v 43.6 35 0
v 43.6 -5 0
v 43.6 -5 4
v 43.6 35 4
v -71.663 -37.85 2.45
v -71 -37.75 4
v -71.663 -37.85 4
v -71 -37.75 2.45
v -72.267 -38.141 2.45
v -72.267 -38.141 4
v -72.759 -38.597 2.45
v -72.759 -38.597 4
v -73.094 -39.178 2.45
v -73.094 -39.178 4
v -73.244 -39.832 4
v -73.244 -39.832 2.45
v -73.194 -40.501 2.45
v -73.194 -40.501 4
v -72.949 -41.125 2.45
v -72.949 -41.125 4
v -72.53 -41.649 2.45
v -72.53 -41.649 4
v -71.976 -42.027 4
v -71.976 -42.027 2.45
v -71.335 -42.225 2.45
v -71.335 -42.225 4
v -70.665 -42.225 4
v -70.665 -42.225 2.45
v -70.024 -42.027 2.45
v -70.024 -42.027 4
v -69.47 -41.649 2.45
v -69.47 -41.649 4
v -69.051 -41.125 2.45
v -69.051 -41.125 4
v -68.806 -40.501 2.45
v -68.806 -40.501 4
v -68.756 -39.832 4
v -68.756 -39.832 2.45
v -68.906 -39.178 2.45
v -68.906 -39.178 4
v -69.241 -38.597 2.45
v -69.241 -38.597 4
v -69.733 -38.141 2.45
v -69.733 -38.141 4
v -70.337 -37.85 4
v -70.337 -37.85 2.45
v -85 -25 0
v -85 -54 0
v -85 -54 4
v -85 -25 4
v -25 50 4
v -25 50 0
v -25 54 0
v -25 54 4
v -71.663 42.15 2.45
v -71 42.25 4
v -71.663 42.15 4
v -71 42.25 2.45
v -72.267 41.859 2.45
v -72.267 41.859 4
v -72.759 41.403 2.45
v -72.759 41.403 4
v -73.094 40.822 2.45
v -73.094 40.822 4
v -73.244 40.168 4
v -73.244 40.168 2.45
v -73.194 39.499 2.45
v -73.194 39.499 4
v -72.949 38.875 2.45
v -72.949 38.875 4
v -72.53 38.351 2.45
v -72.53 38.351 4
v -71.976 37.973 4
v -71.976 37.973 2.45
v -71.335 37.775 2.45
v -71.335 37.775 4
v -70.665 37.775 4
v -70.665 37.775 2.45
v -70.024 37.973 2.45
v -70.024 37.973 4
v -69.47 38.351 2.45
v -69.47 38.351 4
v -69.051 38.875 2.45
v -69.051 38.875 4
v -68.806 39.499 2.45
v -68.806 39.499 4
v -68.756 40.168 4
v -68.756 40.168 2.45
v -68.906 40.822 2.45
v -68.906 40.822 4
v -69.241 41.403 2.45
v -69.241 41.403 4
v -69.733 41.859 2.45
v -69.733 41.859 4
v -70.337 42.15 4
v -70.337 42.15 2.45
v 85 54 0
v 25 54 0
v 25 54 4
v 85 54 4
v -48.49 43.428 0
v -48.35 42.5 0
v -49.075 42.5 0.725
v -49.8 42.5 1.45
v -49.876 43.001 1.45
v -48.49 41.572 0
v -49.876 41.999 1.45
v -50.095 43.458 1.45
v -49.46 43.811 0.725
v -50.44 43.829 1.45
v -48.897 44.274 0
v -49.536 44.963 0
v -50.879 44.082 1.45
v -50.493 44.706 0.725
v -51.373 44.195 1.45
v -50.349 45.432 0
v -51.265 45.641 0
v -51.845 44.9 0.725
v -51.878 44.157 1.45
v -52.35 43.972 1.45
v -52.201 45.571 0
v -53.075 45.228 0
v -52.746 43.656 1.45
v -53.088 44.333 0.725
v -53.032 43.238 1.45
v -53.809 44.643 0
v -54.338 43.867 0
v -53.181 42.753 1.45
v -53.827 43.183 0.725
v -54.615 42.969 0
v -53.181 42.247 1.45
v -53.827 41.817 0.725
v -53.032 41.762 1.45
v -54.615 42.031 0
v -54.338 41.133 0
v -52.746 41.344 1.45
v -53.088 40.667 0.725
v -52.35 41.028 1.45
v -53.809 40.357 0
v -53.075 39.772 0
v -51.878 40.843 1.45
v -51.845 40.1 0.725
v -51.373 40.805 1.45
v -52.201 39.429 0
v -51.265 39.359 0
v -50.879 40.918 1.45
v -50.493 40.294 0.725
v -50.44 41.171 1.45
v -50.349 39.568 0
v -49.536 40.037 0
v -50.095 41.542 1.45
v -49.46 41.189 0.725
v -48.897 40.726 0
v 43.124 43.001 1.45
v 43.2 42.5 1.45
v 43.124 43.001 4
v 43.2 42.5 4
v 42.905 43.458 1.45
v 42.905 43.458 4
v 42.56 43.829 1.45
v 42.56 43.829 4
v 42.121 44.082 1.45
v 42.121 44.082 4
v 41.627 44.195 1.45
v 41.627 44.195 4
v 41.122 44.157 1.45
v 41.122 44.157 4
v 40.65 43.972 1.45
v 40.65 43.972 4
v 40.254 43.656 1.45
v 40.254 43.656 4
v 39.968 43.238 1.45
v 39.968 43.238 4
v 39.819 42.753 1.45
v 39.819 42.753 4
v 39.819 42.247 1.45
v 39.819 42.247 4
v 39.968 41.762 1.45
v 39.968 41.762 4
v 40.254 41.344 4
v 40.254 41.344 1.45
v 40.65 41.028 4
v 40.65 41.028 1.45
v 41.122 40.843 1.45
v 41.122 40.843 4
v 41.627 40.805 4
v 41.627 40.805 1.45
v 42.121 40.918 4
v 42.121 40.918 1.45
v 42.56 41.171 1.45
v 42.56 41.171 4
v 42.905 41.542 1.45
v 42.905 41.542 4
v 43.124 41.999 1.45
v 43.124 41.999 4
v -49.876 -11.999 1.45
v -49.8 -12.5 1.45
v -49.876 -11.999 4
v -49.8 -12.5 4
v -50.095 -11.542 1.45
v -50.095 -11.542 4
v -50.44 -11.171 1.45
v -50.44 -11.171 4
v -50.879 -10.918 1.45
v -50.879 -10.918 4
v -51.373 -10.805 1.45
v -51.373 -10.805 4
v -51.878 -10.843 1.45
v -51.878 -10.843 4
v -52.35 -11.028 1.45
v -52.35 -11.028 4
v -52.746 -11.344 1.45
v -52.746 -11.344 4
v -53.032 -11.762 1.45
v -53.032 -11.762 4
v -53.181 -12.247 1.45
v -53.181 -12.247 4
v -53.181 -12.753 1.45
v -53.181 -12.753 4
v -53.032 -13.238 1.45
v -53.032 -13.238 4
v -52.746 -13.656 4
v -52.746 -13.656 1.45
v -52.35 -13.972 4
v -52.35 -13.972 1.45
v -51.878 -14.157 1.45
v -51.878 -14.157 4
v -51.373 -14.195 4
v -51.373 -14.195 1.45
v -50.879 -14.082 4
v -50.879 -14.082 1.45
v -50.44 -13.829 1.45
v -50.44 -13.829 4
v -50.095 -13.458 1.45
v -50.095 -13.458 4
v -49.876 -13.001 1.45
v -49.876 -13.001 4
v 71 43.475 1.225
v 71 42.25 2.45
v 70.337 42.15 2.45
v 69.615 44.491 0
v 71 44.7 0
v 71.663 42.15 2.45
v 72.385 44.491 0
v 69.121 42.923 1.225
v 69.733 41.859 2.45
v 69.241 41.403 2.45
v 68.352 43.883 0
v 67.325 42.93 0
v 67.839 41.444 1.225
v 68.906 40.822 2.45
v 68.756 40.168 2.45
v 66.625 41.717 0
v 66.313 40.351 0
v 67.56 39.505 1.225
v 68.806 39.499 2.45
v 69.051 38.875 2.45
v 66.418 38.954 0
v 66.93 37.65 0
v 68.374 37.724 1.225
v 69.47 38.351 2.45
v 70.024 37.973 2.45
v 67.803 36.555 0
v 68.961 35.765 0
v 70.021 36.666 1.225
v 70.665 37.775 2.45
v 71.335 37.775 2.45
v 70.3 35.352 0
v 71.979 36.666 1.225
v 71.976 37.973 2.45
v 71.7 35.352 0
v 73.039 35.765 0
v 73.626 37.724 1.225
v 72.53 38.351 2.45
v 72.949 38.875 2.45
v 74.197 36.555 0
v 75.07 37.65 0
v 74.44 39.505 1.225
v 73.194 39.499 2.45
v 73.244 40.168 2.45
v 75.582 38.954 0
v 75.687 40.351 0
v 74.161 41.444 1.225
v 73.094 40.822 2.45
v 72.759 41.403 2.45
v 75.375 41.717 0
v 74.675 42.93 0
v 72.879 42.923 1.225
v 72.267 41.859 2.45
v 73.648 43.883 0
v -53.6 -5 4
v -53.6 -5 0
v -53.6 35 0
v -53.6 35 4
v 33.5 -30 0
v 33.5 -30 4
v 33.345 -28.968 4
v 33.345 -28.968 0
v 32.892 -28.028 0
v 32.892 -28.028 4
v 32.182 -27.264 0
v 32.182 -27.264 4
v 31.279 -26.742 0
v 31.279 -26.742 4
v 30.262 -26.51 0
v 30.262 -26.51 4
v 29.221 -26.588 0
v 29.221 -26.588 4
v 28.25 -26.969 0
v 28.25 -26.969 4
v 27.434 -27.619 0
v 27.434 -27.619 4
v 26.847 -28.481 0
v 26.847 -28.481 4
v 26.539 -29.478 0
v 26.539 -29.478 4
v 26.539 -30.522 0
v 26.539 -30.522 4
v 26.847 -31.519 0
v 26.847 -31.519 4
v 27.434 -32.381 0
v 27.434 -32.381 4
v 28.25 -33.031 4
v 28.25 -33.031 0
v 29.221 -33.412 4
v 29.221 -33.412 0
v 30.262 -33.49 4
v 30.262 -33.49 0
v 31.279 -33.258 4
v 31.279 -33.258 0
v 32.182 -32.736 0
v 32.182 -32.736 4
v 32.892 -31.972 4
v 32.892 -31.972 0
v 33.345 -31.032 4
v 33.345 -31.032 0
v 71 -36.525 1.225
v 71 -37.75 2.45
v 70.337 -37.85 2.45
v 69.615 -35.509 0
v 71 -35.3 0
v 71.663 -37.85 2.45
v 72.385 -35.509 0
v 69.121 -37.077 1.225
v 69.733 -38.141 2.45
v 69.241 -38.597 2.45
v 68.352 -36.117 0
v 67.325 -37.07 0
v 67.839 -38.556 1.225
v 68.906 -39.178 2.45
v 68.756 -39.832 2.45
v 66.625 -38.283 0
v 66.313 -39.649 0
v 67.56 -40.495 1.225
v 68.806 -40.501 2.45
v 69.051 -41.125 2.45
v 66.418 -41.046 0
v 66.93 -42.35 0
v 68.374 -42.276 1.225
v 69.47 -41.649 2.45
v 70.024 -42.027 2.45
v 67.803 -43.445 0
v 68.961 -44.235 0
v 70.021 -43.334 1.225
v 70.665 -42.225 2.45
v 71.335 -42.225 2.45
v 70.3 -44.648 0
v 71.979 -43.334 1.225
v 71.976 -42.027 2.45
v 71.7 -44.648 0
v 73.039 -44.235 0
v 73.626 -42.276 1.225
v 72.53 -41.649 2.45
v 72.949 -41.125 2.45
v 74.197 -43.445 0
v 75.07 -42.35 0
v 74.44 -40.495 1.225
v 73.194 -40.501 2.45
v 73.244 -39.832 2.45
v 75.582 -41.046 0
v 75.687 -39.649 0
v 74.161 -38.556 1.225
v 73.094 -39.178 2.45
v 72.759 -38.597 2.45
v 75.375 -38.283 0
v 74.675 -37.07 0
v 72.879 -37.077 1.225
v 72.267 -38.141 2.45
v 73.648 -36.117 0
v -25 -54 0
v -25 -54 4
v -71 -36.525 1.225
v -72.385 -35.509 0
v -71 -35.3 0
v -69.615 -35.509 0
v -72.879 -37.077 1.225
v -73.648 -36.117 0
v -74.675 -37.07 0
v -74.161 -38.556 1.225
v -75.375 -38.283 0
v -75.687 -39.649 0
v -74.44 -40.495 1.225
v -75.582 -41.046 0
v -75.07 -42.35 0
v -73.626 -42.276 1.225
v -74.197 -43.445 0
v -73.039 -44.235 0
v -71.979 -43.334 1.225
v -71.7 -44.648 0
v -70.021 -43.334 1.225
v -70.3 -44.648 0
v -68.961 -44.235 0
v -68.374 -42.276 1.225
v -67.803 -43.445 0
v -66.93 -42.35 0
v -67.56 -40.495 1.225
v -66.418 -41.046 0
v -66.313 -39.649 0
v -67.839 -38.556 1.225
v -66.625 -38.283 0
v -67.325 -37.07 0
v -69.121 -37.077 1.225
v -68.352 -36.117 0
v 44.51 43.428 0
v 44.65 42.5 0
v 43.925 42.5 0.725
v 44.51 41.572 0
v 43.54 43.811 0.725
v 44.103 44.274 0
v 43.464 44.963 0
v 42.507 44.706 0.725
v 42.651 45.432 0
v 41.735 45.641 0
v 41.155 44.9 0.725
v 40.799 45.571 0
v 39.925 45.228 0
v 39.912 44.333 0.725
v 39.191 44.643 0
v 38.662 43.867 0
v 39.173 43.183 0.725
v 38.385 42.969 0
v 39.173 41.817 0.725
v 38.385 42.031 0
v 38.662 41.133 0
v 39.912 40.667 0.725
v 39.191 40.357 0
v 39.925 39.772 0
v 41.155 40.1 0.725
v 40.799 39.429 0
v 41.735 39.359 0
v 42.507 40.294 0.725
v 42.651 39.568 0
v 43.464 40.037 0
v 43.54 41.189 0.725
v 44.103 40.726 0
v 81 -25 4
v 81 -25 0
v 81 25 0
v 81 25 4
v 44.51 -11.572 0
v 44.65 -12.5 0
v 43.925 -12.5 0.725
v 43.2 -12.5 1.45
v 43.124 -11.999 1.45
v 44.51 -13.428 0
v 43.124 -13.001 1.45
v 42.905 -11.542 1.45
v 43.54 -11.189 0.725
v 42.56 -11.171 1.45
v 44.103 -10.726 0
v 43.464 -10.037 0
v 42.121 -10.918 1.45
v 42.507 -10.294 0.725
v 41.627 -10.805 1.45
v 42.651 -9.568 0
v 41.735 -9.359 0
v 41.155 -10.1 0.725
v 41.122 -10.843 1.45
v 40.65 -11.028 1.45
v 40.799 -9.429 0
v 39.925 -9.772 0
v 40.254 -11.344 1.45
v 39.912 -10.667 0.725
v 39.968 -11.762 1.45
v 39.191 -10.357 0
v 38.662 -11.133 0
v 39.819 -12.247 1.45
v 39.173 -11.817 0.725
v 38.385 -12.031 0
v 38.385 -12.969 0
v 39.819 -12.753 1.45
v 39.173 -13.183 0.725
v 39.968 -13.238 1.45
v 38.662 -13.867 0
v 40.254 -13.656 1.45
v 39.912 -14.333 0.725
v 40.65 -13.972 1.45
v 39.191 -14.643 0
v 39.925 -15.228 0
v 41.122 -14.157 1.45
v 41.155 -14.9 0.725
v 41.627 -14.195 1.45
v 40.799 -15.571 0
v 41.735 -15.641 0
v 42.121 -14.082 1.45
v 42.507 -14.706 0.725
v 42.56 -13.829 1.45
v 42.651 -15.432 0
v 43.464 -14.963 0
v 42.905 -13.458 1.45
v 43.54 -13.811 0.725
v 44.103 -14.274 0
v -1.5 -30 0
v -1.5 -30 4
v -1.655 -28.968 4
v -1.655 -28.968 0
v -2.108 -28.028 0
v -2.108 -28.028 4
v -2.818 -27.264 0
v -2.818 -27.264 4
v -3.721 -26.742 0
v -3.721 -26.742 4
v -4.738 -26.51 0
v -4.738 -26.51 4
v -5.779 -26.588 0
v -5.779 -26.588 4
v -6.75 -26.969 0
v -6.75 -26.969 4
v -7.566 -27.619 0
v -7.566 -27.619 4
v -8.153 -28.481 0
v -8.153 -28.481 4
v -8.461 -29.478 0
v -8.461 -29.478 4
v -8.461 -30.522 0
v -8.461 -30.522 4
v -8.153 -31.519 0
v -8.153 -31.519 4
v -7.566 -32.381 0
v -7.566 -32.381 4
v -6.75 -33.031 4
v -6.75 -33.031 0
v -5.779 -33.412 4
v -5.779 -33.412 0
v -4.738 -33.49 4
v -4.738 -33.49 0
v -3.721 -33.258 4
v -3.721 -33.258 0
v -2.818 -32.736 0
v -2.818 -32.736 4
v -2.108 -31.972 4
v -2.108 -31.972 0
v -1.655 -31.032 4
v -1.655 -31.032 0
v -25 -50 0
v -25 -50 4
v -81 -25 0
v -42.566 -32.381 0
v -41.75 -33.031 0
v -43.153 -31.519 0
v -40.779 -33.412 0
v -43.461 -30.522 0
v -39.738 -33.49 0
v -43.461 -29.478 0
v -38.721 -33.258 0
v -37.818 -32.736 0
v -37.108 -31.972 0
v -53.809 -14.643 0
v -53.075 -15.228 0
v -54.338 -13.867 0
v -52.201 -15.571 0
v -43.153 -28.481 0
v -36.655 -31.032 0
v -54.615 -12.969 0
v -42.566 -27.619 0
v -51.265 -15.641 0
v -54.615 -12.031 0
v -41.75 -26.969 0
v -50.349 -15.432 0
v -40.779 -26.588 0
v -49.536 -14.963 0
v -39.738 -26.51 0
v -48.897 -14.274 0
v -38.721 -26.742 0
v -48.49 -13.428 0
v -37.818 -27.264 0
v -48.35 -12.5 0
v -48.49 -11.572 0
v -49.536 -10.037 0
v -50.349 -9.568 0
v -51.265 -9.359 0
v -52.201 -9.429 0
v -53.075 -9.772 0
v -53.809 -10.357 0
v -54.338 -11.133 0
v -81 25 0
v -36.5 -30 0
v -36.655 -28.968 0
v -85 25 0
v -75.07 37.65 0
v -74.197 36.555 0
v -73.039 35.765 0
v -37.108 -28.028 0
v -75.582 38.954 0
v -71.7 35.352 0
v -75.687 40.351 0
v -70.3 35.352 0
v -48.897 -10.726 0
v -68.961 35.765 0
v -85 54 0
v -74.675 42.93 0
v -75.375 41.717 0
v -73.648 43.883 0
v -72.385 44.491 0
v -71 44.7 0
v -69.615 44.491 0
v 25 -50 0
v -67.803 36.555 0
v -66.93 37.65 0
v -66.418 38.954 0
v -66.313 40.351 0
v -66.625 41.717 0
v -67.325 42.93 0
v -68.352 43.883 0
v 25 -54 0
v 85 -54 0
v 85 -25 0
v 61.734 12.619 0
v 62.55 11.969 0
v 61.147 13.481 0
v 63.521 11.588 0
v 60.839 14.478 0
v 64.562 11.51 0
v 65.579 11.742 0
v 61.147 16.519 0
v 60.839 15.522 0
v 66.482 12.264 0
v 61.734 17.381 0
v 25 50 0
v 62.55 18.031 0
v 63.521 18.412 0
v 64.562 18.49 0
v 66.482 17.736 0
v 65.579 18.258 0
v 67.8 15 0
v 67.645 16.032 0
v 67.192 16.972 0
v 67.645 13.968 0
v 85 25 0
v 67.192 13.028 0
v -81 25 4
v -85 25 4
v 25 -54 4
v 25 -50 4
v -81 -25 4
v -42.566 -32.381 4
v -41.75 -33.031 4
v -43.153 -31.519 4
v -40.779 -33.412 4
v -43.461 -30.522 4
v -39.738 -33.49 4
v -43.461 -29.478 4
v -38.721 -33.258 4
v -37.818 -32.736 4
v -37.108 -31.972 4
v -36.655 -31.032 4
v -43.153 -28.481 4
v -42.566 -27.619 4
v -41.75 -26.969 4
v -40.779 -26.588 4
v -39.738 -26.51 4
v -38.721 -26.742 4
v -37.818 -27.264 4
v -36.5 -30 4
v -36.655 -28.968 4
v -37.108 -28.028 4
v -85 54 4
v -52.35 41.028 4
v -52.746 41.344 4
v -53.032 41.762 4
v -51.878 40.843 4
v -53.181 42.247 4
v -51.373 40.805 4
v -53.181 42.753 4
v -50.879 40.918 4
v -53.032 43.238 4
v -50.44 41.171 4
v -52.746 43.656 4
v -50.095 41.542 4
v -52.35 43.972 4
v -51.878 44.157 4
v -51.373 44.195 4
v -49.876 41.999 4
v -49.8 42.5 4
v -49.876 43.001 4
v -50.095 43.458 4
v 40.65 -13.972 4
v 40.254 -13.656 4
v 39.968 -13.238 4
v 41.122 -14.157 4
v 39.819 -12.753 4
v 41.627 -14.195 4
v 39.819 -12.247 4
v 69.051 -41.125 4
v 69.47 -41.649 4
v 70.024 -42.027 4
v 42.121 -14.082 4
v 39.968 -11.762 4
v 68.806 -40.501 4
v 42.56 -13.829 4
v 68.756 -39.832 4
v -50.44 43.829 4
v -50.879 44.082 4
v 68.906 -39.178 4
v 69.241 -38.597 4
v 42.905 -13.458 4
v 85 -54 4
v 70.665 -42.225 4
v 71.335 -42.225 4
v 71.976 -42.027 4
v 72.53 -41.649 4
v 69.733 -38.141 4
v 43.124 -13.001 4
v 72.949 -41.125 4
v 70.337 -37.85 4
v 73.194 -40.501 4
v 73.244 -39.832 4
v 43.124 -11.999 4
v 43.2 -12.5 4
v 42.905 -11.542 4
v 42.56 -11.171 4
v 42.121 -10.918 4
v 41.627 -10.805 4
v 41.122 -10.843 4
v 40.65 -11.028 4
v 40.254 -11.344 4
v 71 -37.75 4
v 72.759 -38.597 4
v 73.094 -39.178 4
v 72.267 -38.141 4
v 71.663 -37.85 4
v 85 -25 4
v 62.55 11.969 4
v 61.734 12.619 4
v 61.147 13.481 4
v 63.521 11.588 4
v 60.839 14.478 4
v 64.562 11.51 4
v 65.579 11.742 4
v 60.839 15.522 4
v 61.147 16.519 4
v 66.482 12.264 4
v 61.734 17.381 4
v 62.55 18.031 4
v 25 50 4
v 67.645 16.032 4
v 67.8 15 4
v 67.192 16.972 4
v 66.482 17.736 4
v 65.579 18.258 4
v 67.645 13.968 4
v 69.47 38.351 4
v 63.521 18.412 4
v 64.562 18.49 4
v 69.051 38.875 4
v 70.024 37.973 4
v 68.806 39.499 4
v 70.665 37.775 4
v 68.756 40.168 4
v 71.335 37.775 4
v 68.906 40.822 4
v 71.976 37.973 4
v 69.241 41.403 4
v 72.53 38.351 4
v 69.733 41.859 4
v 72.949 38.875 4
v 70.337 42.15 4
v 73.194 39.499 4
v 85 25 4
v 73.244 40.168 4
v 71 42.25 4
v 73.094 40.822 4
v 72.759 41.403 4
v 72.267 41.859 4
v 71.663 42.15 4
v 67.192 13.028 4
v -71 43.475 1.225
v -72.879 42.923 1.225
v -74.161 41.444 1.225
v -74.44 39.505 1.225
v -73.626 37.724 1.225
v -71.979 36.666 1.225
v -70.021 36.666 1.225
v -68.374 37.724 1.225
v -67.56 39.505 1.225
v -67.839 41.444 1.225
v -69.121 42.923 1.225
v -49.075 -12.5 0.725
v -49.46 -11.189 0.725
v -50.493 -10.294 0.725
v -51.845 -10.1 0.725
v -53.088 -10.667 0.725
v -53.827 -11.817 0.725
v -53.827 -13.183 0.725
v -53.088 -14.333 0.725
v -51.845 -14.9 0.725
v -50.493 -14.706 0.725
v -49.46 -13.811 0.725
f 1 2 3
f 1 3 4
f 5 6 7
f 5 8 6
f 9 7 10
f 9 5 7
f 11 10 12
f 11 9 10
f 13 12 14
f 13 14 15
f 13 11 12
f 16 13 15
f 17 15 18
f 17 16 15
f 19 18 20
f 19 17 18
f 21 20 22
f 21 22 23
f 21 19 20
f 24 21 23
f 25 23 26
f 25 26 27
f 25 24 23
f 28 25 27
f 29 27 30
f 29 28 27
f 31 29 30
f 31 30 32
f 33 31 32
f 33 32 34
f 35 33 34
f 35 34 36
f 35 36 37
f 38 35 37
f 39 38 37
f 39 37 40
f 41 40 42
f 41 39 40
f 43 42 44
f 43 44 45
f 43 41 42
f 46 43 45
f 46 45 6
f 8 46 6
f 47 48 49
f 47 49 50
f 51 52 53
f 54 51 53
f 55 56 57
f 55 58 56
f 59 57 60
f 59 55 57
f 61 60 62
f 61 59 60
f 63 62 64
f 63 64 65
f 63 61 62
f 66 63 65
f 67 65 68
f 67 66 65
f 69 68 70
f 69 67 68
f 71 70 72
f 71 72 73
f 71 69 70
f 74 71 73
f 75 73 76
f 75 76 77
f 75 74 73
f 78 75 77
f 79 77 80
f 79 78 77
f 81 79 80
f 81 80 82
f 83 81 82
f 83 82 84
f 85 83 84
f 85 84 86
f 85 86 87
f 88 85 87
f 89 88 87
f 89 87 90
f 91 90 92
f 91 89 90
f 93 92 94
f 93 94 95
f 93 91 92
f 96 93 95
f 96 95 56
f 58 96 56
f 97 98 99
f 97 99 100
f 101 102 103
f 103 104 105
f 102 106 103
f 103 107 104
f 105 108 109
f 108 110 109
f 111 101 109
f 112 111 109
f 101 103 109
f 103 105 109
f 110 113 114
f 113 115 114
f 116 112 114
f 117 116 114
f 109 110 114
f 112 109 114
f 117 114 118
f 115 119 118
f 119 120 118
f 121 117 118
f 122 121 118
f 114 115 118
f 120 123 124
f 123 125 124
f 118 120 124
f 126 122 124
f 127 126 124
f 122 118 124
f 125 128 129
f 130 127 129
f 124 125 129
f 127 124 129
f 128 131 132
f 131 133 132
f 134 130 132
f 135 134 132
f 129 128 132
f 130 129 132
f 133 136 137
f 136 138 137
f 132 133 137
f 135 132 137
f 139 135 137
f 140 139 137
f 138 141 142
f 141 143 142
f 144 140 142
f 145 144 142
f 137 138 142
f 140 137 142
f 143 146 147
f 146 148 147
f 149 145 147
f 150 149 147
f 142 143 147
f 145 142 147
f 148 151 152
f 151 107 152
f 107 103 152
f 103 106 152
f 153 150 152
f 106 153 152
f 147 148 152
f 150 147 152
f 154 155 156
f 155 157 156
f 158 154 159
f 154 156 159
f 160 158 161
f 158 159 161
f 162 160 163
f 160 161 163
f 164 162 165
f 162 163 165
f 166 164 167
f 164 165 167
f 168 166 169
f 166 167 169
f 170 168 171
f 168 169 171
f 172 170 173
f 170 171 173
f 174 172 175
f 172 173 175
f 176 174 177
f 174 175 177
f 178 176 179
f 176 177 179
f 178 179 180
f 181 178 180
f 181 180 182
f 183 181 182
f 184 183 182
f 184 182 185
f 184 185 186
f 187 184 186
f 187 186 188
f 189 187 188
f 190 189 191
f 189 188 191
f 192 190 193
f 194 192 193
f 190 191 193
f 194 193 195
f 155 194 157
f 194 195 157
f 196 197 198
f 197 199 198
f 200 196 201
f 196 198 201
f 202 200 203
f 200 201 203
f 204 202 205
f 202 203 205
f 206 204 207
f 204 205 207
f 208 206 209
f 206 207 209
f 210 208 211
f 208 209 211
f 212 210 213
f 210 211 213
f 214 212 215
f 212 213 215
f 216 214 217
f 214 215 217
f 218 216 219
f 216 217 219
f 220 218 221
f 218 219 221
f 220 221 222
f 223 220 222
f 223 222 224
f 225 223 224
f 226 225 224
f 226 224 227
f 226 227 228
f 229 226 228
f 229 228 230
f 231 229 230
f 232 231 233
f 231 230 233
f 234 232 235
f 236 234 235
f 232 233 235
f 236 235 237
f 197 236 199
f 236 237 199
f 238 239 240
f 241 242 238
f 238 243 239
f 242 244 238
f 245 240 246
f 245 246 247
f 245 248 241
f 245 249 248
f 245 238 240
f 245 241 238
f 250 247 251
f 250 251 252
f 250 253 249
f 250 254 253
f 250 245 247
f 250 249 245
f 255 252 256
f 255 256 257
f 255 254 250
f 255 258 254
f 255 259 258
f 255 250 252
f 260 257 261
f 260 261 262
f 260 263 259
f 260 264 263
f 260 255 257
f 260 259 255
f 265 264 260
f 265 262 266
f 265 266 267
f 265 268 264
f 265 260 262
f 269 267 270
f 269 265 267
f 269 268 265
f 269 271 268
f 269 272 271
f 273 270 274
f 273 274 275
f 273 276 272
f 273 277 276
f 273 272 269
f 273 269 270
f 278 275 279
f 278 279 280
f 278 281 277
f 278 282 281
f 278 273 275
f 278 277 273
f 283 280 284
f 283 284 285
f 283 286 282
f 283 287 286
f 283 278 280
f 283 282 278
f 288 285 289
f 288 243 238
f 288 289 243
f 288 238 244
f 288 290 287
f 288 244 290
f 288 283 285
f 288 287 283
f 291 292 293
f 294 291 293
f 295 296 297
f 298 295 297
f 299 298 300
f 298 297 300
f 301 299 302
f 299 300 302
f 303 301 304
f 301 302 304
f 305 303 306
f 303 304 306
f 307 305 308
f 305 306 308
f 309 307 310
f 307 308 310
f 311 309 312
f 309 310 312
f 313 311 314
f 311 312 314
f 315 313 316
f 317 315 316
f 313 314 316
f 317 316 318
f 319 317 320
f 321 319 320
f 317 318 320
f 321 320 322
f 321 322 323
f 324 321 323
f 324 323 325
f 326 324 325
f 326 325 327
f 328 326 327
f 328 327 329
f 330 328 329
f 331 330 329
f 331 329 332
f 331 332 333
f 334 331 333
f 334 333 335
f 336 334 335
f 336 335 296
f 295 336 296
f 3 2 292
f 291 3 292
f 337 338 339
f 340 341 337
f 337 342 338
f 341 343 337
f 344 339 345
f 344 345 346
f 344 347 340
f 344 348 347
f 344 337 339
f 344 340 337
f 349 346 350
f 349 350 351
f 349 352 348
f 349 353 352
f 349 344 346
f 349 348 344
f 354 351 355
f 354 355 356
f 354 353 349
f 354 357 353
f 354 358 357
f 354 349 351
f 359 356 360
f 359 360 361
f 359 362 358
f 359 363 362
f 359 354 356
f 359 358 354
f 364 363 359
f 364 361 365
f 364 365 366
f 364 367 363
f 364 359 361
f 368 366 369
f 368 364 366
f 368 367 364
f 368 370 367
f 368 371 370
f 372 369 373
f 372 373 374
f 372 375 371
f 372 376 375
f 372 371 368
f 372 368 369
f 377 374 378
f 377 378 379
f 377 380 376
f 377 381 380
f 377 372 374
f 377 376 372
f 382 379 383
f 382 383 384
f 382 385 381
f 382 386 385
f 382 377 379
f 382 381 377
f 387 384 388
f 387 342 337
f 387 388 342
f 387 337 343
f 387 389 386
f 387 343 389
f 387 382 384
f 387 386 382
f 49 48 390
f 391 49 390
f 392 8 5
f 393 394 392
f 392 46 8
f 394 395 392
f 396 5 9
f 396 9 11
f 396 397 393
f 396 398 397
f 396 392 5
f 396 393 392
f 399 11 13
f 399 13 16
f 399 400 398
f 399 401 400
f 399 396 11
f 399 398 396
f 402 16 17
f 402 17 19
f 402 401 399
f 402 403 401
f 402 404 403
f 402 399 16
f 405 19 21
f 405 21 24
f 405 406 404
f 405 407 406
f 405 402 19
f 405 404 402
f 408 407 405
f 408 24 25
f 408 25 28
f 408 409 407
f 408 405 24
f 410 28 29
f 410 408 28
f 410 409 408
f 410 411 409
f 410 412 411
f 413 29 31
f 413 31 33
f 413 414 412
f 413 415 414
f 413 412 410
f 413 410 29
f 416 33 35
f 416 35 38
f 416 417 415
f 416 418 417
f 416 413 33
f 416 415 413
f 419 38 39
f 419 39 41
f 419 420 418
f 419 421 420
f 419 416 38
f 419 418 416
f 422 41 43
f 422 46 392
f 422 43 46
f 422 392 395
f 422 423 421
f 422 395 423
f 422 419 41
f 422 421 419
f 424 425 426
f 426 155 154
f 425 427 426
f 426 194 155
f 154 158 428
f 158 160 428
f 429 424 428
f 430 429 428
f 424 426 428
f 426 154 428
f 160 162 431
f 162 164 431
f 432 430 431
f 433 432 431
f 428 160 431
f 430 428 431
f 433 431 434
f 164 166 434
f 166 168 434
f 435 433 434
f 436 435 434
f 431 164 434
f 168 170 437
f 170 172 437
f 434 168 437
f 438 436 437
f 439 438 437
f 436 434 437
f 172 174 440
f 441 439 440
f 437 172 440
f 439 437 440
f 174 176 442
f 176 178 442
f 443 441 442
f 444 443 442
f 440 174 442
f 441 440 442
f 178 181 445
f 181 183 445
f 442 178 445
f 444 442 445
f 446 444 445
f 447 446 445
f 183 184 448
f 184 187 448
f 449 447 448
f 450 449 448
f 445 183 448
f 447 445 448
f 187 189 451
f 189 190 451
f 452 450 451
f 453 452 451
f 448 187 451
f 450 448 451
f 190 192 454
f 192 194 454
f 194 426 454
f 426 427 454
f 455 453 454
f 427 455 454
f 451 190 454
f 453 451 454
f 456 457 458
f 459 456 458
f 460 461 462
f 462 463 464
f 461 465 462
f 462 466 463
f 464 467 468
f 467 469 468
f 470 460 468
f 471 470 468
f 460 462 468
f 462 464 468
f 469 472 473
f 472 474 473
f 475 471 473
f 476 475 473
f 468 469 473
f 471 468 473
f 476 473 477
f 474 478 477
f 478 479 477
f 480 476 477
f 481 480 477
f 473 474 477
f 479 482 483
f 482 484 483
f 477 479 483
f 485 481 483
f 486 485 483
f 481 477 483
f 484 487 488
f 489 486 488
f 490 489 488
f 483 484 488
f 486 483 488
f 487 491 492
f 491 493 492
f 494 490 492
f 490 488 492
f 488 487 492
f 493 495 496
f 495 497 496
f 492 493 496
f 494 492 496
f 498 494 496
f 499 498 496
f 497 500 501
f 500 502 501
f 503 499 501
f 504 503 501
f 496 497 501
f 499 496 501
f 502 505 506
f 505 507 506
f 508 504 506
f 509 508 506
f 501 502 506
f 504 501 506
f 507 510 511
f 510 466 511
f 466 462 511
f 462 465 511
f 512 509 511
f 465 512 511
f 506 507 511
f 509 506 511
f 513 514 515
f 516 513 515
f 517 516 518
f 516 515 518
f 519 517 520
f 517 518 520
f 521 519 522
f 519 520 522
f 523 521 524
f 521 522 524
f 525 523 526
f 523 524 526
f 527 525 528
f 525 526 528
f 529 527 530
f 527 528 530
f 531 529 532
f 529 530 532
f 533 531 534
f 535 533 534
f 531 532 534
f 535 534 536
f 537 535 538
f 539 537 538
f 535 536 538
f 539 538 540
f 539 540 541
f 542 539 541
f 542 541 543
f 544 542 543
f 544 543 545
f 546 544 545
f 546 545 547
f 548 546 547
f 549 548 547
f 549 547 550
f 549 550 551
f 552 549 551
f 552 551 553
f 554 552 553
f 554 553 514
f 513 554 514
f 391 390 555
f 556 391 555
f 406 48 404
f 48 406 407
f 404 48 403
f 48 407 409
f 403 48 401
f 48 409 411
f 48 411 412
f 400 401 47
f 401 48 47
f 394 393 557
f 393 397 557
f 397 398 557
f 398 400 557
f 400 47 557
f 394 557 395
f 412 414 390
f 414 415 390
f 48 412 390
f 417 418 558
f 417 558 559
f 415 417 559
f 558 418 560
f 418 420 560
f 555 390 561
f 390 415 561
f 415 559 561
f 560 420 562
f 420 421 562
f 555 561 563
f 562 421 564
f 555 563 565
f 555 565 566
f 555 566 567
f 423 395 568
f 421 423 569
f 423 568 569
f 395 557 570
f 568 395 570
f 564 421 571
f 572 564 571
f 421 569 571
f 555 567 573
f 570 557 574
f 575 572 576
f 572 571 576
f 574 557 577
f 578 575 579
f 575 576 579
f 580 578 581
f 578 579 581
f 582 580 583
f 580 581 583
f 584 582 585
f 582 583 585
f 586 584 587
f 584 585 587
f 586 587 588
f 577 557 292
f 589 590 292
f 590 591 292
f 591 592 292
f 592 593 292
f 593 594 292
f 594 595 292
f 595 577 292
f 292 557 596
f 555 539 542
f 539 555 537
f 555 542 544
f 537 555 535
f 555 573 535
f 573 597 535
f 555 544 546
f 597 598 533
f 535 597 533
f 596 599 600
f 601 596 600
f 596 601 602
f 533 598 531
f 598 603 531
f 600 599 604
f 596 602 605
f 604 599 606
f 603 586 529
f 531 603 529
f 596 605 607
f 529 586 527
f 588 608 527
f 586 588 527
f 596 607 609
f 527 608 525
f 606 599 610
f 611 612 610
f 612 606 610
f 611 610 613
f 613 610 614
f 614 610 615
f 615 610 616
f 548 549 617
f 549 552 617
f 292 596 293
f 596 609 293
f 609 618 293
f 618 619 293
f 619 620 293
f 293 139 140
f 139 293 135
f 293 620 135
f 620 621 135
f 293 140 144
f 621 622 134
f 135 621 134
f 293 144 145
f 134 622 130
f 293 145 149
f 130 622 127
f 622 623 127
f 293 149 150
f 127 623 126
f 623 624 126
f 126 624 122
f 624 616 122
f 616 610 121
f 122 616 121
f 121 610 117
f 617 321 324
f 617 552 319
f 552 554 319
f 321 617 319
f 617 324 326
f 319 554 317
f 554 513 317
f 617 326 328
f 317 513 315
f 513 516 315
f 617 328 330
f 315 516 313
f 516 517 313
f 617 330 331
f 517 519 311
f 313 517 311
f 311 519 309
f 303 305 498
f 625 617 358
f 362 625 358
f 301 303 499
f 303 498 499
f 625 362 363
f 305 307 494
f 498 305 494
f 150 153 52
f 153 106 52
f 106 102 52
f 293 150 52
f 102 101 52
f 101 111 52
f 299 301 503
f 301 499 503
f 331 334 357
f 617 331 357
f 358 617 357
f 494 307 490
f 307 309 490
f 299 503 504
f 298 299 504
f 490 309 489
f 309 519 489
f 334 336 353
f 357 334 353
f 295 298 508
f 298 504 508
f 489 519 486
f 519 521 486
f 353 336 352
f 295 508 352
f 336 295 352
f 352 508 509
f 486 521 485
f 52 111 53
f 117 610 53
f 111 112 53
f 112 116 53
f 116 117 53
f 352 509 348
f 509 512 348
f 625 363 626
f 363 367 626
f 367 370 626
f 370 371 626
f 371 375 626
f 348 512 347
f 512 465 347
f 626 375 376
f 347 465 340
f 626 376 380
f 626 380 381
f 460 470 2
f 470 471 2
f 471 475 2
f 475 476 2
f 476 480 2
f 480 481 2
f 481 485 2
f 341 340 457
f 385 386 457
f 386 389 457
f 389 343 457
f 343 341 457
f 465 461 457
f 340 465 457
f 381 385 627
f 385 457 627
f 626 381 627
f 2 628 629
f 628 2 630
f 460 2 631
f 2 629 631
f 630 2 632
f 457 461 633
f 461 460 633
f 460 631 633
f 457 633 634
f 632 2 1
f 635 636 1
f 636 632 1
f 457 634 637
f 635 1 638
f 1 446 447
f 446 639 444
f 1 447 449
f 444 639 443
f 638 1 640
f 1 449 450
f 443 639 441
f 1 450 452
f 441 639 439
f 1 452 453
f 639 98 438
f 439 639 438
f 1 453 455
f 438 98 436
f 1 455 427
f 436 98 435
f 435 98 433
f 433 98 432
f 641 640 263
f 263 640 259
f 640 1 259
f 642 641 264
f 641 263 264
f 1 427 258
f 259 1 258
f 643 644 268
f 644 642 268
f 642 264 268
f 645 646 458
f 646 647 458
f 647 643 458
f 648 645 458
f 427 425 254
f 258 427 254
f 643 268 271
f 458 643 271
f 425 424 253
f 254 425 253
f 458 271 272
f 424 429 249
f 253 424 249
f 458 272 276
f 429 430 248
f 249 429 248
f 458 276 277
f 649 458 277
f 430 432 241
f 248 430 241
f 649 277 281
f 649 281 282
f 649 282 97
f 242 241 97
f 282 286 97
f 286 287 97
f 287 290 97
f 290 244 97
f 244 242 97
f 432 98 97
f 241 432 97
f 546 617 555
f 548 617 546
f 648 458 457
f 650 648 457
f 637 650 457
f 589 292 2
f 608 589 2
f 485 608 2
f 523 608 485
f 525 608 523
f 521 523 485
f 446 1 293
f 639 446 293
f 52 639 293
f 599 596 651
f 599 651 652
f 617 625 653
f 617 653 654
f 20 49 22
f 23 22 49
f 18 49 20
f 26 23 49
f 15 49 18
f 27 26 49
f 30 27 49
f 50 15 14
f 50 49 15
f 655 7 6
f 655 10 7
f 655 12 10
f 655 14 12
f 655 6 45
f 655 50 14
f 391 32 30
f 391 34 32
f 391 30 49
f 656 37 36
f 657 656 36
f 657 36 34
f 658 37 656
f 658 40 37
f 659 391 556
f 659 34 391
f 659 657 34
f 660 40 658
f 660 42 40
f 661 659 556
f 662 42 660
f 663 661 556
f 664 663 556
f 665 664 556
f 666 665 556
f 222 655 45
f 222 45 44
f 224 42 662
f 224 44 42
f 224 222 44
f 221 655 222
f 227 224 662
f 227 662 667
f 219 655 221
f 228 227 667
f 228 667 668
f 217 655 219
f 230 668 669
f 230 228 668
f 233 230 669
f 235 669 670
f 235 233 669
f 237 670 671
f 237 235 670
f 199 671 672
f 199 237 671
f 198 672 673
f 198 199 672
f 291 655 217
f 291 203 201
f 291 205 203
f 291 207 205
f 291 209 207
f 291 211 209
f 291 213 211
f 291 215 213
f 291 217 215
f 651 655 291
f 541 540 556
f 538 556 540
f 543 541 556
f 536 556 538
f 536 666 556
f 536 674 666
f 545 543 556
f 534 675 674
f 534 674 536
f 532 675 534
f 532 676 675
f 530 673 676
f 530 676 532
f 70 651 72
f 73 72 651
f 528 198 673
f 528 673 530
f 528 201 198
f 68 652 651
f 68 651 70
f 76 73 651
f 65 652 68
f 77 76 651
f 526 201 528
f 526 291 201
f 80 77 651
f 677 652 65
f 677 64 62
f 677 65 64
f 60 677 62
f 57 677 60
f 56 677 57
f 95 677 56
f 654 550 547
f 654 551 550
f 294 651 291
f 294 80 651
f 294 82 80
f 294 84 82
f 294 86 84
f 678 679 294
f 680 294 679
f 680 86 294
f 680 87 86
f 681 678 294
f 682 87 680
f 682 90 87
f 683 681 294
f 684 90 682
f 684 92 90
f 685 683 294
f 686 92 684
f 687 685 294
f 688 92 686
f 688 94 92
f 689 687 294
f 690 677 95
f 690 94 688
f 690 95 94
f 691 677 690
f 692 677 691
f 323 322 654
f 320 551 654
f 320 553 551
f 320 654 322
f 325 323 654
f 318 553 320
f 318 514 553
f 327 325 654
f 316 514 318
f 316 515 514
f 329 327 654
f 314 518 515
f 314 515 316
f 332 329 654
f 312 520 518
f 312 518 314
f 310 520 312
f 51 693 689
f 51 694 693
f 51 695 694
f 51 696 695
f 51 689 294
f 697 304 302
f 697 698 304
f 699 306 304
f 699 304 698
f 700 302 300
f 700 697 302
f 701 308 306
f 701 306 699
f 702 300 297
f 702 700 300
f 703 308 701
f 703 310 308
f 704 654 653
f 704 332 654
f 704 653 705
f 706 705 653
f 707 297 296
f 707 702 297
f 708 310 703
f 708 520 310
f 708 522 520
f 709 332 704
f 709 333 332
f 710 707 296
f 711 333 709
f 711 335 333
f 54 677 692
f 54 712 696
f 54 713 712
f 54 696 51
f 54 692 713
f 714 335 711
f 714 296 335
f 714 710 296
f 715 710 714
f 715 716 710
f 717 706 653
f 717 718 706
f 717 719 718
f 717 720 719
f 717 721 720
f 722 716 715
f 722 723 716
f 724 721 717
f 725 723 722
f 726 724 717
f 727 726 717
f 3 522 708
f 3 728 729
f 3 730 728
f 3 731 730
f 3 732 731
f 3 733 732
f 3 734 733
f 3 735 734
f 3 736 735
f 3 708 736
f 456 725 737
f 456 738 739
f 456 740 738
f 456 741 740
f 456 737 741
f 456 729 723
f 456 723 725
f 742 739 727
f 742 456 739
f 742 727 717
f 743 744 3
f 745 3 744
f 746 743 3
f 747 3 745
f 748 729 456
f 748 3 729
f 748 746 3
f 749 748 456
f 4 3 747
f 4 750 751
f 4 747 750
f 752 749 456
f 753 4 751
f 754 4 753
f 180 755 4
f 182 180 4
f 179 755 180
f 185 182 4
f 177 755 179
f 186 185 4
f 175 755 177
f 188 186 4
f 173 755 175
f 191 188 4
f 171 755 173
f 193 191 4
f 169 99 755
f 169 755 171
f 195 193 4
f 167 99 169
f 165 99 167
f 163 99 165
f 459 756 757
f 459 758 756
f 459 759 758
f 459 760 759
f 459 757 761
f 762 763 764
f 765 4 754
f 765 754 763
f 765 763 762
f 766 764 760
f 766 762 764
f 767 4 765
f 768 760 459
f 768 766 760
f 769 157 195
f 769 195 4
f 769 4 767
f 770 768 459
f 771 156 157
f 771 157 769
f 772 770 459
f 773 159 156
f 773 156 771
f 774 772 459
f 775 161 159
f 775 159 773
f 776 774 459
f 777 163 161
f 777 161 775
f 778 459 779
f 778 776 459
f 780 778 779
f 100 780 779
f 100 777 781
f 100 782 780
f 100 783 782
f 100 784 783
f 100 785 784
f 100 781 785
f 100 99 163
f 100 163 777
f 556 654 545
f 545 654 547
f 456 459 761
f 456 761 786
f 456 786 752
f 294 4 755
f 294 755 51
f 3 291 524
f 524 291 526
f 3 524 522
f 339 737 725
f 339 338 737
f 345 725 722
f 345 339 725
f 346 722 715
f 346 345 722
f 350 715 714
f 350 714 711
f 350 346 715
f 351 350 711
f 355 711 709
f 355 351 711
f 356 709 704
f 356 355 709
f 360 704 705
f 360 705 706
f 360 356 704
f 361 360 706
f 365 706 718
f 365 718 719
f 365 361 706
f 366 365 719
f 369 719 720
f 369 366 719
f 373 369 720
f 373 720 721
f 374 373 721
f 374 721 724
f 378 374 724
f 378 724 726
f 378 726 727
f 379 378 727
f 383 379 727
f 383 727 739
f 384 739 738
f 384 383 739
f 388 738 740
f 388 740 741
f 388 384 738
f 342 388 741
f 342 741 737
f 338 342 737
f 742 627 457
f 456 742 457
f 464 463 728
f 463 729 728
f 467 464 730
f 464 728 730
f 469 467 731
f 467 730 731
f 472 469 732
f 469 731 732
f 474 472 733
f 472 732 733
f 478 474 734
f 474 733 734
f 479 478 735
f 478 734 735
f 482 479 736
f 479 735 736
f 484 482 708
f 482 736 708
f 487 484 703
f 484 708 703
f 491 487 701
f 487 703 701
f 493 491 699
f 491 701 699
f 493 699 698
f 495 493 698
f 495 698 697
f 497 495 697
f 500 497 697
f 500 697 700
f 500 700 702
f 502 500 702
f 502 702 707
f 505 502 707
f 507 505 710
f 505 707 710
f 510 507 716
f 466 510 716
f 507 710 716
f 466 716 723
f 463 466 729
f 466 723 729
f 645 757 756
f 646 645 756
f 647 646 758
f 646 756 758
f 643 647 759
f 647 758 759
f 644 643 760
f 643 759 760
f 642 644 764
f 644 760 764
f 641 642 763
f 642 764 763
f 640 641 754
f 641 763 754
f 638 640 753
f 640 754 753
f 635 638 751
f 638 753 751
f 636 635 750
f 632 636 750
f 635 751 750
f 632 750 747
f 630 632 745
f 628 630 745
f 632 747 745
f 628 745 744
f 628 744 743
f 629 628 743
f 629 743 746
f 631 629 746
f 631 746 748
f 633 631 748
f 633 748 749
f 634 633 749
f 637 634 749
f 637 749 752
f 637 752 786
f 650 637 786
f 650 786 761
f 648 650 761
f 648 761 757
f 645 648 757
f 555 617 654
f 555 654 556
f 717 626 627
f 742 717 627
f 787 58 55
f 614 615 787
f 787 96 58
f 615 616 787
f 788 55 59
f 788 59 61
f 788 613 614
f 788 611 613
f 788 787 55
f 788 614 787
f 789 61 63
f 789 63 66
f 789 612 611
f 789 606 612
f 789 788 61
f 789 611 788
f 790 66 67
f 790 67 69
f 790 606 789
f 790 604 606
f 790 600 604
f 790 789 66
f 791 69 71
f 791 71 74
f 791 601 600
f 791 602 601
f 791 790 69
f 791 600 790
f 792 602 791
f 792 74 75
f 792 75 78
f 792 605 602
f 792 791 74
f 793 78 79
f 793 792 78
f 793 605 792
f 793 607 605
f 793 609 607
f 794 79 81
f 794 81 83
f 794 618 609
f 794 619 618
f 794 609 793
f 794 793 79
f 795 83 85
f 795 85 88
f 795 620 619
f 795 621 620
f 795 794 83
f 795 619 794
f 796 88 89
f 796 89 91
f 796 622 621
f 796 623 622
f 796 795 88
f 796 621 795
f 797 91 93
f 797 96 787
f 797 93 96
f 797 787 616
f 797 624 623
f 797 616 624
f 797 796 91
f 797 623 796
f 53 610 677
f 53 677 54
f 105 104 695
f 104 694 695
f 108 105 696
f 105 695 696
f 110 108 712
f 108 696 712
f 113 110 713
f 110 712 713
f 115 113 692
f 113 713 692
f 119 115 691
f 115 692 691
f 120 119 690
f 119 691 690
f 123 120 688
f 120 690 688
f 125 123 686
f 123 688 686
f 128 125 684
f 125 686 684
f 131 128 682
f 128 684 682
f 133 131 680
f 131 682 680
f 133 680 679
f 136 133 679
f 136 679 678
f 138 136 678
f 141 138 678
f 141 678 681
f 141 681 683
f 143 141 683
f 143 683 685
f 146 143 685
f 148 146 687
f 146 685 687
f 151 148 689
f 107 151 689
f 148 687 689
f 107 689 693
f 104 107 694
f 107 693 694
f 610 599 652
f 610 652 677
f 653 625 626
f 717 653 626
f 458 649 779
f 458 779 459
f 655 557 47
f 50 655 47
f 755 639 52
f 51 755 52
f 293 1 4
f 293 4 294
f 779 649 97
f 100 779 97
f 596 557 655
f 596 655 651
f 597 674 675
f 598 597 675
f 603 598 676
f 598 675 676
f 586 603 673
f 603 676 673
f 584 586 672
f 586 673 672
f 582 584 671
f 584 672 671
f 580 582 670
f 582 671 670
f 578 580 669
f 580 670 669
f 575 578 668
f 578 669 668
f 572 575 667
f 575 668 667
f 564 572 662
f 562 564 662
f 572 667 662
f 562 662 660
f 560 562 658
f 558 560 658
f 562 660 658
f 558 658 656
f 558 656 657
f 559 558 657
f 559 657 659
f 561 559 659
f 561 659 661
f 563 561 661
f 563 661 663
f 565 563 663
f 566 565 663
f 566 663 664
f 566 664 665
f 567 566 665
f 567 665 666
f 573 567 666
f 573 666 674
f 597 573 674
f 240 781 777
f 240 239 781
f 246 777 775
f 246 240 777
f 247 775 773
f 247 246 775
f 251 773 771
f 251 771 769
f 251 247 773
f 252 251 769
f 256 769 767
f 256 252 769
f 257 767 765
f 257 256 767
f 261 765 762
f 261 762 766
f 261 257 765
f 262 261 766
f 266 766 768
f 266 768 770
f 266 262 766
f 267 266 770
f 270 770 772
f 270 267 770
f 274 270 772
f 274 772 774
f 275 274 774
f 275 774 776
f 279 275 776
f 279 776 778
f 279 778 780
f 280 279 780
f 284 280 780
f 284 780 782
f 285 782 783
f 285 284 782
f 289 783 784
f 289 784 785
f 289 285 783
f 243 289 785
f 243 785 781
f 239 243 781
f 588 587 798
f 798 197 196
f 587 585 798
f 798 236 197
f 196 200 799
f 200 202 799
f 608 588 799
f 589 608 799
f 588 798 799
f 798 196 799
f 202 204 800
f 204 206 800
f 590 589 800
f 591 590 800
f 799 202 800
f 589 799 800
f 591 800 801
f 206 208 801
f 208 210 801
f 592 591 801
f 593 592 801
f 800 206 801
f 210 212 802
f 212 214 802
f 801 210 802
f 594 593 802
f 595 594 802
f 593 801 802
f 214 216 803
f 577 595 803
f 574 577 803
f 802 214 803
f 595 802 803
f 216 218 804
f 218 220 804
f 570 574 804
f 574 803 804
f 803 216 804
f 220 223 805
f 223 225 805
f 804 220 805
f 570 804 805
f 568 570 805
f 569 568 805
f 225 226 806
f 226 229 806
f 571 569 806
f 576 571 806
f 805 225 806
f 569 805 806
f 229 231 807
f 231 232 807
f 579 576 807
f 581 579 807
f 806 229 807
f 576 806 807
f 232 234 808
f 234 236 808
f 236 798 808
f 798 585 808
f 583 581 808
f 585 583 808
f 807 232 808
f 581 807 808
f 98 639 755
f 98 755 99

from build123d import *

# Parameters (mm, degrees)
SKETCH1_W                                    = 170
SKETCH1_H                                    = 108
PLATE_DEPTH                                  = 4
SKETCH2_W                                    = 97.2
SKETCH2_H                                    = 40
SCREEN_SLOT_DEPTH                            = 101.781942827
SCREEN_SCREW_HOLES_D                         = 3.4
SCREEN_SCREW_HOLES_CSINK_D                   = 6.3
SCREEN_SCREW_HOLES_CSINK_ANGLE               = 90
KNOB_HOLES_D                                 = 7
CUT_EXTRUDE2_REACH                           = 102.782
SKETCH8_W                                    = 50
SKETCH8_H                                    = 4
SKETCH8_W_2                                  = 4
SKETCH8_H_2                                  = 50
CSK_FOR_M4_COUNTERSUNK_FLAT_HEAD_SCR_2_COUNT = 2
CSK_FOR_M4_COUNTERSUNK_FLAT_HEAD_SCR_2_PITCH = 142
CSK_FOR_M4_COUNTERSUNK_FLAT_HEAD_SCR_3_COUNT = 2
CSK_FOR_M4_COUNTERSUNK_FLAT_HEAD_SCR_3_PITCH = 162.984661855
CSK_FOR_M4_COUNTERSUNK_FLAT_HEAD_SCR_4_COUNT = 2
CSK_FOR_M4_COUNTERSUNK_FLAT_HEAD_SCR_4_PITCH = 80


with BuildPart() as part:
    # Sketch1 → Plate (new body)
    with BuildSketch(Plane.XY):
        Rectangle(SKETCH1_W, SKETCH1_H)
    extrude(amount=PLATE_DEPTH)

    # Sketch2 → Screen slot (cut, through all)
    with BuildSketch(Plane(origin=(0, 0, 0), x_dir=(-1, 0, 0), z_dir=(0, 0, -1))):
        with Locations((5, 15)):
            Rectangle(SKETCH2_W, SKETCH2_H)
    extrude(amount=-SCREEN_SLOT_DEPTH, mode=Mode.SUBTRACT)

    # Screen screw holes (through all)
    with Locations(Plane(origin=(41.5, 42.5, 0), x_dir=(-1, 0, 0), z_dir=(0, 0, -1))):
        with Locations((0, 0), (93, 0), (93, -55), (0, -55)):
            CounterSinkHole(SCREEN_SCREW_HOLES_D / 2, SCREEN_SCREW_HOLES_CSINK_D / 2, counter_sink_angle=SCREEN_SCREW_HOLES_CSINK_ANGLE)

    # Knob holes (through all)
    with Locations(Plane(origin=(30, -30, 0), x_dir=(-1, 0, 0), z_dir=(0, 0, -1))):
        with Locations((0, 0), (35, 0), (70, 0), (-34.3, 45)):
            Hole(KNOB_HOLES_D / 2)

    # Sketch8 → Cut-Extrude2 (cut, up to next)
    with BuildSketch(Plane(origin=(0, 0, 0), x_dir=(-1, 0, 0), z_dir=(0, 0, -1)), mode=Mode.PRIVATE) as cut_extrude2_sk1:
        with Locations((0, 52)):
            Rectangle(SKETCH8_W, SKETCH8_H)
    cut_extrude2_tool1 = extrude(cut_extrude2_sk1.sketch, amount=-CUT_EXTRUDE2_REACH, mode=Mode.PRIVATE) & part.part
    # Sketch8 → Cut-Extrude2 (cut, up to next)
    with BuildSketch(Plane(origin=(0, 0, 0), x_dir=(-1, 0, 0), z_dir=(0, 0, -1)), mode=Mode.PRIVATE) as cut_extrude2_sk2:
        with Locations((83, 0)):
            Rectangle(SKETCH8_W_2, SKETCH8_H_2)
    cut_extrude2_tool2 = extrude(cut_extrude2_sk2.sketch, amount=-CUT_EXTRUDE2_REACH, mode=Mode.PRIVATE) & part.part
    # Sketch8 → Cut-Extrude2 (cut, up to next)
    with BuildSketch(Plane(origin=(0, 0, 0), x_dir=(-1, 0, 0), z_dir=(0, 0, -1)), mode=Mode.PRIVATE) as cut_extrude2_sk3:
        with Locations((0, -52)):
            Rectangle(SKETCH8_W, SKETCH8_H)
    cut_extrude2_tool3 = extrude(cut_extrude2_sk3.sketch, amount=-CUT_EXTRUDE2_REACH, mode=Mode.PRIVATE) & part.part
    # Sketch8 → Cut-Extrude2 (cut, up to next)
    with BuildSketch(Plane(origin=(0, 0, 0), x_dir=(-1, 0, 0), z_dir=(0, 0, -1)), mode=Mode.PRIVATE) as cut_extrude2_sk4:
        with Locations((-83, 0)):
            Rectangle(SKETCH8_W_2, SKETCH8_H_2)
    cut_extrude2_tool4 = extrude(cut_extrude2_sk4.sketch, amount=-CUT_EXTRUDE2_REACH, mode=Mode.PRIVATE) & part.part
    add(cut_extrude2_tool1.solids().sort_by_distance((0, 52, 0))[0], mode=Mode.SUBTRACT)
    add(cut_extrude2_tool2.solids().sort_by_distance((-83, 0, 0))[0], mode=Mode.SUBTRACT)
    add(cut_extrude2_tool3.solids().sort_by_distance((0, -52, 0))[0], mode=Mode.SUBTRACT)
    add(cut_extrude2_tool4.solids().sort_by_distance((83, 0, 0))[0], mode=Mode.SUBTRACT)

    # Sketch10 → CSK for M4 Countersunk Flat Head Screw1 (revolve, cut)
    with BuildSketch(Plane(origin=(71, 40, 0), x_dir=(0, 1, 0), z_dir=(1, 0, 0))):
        Polygon((0, 0), (0, 4), (2.25, 4), (2.25, 2.45), (4.7, 0), align=None)
    csk_for_m4_countersunk_flat_head_screw1 = revolve(axis=Axis((71, 40, -6.35), (0, 0, 1)), mode=Mode.SUBTRACT)

    # CSK for M4 Countersunk Flat Head Scr 2: CSK for M4 Countersunk Flat Head Screw1 ×2
    with Locations(*[(-i * CSK_FOR_M4_COUNTERSUNK_FLAT_HEAD_SCR_2_PITCH, 0, 0) for i in range(1, CSK_FOR_M4_COUNTERSUNK_FLAT_HEAD_SCR_2_COUNT)]):
        add(csk_for_m4_countersunk_flat_head_screw1, mode=Mode.SUBTRACT)

    # CSK for M4 Countersunk Flat Head Scr 3: CSK for M4 Countersunk Flat Head Screw1 ×2
    with Locations(*[Vector(-0.8712476277448776, -0.49084373394077596, 0) * (i * CSK_FOR_M4_COUNTERSUNK_FLAT_HEAD_SCR_3_PITCH) for i in range(1, CSK_FOR_M4_COUNTERSUNK_FLAT_HEAD_SCR_3_COUNT)]):
        add(csk_for_m4_countersunk_flat_head_screw1, mode=Mode.SUBTRACT)

    # CSK for M4 Countersunk Flat Head Scr 4: CSK for M4 Countersunk Flat Head Screw1 ×2
    with Locations(*[(0, -i * CSK_FOR_M4_COUNTERSUNK_FLAT_HEAD_SCR_4_PITCH, 0) for i in range(1, CSK_FOR_M4_COUNTERSUNK_FLAT_HEAD_SCR_4_COUNT)]):
        add(csk_for_m4_countersunk_flat_head_screw1, mode=Mode.SUBTRACT)


solid = part.part
